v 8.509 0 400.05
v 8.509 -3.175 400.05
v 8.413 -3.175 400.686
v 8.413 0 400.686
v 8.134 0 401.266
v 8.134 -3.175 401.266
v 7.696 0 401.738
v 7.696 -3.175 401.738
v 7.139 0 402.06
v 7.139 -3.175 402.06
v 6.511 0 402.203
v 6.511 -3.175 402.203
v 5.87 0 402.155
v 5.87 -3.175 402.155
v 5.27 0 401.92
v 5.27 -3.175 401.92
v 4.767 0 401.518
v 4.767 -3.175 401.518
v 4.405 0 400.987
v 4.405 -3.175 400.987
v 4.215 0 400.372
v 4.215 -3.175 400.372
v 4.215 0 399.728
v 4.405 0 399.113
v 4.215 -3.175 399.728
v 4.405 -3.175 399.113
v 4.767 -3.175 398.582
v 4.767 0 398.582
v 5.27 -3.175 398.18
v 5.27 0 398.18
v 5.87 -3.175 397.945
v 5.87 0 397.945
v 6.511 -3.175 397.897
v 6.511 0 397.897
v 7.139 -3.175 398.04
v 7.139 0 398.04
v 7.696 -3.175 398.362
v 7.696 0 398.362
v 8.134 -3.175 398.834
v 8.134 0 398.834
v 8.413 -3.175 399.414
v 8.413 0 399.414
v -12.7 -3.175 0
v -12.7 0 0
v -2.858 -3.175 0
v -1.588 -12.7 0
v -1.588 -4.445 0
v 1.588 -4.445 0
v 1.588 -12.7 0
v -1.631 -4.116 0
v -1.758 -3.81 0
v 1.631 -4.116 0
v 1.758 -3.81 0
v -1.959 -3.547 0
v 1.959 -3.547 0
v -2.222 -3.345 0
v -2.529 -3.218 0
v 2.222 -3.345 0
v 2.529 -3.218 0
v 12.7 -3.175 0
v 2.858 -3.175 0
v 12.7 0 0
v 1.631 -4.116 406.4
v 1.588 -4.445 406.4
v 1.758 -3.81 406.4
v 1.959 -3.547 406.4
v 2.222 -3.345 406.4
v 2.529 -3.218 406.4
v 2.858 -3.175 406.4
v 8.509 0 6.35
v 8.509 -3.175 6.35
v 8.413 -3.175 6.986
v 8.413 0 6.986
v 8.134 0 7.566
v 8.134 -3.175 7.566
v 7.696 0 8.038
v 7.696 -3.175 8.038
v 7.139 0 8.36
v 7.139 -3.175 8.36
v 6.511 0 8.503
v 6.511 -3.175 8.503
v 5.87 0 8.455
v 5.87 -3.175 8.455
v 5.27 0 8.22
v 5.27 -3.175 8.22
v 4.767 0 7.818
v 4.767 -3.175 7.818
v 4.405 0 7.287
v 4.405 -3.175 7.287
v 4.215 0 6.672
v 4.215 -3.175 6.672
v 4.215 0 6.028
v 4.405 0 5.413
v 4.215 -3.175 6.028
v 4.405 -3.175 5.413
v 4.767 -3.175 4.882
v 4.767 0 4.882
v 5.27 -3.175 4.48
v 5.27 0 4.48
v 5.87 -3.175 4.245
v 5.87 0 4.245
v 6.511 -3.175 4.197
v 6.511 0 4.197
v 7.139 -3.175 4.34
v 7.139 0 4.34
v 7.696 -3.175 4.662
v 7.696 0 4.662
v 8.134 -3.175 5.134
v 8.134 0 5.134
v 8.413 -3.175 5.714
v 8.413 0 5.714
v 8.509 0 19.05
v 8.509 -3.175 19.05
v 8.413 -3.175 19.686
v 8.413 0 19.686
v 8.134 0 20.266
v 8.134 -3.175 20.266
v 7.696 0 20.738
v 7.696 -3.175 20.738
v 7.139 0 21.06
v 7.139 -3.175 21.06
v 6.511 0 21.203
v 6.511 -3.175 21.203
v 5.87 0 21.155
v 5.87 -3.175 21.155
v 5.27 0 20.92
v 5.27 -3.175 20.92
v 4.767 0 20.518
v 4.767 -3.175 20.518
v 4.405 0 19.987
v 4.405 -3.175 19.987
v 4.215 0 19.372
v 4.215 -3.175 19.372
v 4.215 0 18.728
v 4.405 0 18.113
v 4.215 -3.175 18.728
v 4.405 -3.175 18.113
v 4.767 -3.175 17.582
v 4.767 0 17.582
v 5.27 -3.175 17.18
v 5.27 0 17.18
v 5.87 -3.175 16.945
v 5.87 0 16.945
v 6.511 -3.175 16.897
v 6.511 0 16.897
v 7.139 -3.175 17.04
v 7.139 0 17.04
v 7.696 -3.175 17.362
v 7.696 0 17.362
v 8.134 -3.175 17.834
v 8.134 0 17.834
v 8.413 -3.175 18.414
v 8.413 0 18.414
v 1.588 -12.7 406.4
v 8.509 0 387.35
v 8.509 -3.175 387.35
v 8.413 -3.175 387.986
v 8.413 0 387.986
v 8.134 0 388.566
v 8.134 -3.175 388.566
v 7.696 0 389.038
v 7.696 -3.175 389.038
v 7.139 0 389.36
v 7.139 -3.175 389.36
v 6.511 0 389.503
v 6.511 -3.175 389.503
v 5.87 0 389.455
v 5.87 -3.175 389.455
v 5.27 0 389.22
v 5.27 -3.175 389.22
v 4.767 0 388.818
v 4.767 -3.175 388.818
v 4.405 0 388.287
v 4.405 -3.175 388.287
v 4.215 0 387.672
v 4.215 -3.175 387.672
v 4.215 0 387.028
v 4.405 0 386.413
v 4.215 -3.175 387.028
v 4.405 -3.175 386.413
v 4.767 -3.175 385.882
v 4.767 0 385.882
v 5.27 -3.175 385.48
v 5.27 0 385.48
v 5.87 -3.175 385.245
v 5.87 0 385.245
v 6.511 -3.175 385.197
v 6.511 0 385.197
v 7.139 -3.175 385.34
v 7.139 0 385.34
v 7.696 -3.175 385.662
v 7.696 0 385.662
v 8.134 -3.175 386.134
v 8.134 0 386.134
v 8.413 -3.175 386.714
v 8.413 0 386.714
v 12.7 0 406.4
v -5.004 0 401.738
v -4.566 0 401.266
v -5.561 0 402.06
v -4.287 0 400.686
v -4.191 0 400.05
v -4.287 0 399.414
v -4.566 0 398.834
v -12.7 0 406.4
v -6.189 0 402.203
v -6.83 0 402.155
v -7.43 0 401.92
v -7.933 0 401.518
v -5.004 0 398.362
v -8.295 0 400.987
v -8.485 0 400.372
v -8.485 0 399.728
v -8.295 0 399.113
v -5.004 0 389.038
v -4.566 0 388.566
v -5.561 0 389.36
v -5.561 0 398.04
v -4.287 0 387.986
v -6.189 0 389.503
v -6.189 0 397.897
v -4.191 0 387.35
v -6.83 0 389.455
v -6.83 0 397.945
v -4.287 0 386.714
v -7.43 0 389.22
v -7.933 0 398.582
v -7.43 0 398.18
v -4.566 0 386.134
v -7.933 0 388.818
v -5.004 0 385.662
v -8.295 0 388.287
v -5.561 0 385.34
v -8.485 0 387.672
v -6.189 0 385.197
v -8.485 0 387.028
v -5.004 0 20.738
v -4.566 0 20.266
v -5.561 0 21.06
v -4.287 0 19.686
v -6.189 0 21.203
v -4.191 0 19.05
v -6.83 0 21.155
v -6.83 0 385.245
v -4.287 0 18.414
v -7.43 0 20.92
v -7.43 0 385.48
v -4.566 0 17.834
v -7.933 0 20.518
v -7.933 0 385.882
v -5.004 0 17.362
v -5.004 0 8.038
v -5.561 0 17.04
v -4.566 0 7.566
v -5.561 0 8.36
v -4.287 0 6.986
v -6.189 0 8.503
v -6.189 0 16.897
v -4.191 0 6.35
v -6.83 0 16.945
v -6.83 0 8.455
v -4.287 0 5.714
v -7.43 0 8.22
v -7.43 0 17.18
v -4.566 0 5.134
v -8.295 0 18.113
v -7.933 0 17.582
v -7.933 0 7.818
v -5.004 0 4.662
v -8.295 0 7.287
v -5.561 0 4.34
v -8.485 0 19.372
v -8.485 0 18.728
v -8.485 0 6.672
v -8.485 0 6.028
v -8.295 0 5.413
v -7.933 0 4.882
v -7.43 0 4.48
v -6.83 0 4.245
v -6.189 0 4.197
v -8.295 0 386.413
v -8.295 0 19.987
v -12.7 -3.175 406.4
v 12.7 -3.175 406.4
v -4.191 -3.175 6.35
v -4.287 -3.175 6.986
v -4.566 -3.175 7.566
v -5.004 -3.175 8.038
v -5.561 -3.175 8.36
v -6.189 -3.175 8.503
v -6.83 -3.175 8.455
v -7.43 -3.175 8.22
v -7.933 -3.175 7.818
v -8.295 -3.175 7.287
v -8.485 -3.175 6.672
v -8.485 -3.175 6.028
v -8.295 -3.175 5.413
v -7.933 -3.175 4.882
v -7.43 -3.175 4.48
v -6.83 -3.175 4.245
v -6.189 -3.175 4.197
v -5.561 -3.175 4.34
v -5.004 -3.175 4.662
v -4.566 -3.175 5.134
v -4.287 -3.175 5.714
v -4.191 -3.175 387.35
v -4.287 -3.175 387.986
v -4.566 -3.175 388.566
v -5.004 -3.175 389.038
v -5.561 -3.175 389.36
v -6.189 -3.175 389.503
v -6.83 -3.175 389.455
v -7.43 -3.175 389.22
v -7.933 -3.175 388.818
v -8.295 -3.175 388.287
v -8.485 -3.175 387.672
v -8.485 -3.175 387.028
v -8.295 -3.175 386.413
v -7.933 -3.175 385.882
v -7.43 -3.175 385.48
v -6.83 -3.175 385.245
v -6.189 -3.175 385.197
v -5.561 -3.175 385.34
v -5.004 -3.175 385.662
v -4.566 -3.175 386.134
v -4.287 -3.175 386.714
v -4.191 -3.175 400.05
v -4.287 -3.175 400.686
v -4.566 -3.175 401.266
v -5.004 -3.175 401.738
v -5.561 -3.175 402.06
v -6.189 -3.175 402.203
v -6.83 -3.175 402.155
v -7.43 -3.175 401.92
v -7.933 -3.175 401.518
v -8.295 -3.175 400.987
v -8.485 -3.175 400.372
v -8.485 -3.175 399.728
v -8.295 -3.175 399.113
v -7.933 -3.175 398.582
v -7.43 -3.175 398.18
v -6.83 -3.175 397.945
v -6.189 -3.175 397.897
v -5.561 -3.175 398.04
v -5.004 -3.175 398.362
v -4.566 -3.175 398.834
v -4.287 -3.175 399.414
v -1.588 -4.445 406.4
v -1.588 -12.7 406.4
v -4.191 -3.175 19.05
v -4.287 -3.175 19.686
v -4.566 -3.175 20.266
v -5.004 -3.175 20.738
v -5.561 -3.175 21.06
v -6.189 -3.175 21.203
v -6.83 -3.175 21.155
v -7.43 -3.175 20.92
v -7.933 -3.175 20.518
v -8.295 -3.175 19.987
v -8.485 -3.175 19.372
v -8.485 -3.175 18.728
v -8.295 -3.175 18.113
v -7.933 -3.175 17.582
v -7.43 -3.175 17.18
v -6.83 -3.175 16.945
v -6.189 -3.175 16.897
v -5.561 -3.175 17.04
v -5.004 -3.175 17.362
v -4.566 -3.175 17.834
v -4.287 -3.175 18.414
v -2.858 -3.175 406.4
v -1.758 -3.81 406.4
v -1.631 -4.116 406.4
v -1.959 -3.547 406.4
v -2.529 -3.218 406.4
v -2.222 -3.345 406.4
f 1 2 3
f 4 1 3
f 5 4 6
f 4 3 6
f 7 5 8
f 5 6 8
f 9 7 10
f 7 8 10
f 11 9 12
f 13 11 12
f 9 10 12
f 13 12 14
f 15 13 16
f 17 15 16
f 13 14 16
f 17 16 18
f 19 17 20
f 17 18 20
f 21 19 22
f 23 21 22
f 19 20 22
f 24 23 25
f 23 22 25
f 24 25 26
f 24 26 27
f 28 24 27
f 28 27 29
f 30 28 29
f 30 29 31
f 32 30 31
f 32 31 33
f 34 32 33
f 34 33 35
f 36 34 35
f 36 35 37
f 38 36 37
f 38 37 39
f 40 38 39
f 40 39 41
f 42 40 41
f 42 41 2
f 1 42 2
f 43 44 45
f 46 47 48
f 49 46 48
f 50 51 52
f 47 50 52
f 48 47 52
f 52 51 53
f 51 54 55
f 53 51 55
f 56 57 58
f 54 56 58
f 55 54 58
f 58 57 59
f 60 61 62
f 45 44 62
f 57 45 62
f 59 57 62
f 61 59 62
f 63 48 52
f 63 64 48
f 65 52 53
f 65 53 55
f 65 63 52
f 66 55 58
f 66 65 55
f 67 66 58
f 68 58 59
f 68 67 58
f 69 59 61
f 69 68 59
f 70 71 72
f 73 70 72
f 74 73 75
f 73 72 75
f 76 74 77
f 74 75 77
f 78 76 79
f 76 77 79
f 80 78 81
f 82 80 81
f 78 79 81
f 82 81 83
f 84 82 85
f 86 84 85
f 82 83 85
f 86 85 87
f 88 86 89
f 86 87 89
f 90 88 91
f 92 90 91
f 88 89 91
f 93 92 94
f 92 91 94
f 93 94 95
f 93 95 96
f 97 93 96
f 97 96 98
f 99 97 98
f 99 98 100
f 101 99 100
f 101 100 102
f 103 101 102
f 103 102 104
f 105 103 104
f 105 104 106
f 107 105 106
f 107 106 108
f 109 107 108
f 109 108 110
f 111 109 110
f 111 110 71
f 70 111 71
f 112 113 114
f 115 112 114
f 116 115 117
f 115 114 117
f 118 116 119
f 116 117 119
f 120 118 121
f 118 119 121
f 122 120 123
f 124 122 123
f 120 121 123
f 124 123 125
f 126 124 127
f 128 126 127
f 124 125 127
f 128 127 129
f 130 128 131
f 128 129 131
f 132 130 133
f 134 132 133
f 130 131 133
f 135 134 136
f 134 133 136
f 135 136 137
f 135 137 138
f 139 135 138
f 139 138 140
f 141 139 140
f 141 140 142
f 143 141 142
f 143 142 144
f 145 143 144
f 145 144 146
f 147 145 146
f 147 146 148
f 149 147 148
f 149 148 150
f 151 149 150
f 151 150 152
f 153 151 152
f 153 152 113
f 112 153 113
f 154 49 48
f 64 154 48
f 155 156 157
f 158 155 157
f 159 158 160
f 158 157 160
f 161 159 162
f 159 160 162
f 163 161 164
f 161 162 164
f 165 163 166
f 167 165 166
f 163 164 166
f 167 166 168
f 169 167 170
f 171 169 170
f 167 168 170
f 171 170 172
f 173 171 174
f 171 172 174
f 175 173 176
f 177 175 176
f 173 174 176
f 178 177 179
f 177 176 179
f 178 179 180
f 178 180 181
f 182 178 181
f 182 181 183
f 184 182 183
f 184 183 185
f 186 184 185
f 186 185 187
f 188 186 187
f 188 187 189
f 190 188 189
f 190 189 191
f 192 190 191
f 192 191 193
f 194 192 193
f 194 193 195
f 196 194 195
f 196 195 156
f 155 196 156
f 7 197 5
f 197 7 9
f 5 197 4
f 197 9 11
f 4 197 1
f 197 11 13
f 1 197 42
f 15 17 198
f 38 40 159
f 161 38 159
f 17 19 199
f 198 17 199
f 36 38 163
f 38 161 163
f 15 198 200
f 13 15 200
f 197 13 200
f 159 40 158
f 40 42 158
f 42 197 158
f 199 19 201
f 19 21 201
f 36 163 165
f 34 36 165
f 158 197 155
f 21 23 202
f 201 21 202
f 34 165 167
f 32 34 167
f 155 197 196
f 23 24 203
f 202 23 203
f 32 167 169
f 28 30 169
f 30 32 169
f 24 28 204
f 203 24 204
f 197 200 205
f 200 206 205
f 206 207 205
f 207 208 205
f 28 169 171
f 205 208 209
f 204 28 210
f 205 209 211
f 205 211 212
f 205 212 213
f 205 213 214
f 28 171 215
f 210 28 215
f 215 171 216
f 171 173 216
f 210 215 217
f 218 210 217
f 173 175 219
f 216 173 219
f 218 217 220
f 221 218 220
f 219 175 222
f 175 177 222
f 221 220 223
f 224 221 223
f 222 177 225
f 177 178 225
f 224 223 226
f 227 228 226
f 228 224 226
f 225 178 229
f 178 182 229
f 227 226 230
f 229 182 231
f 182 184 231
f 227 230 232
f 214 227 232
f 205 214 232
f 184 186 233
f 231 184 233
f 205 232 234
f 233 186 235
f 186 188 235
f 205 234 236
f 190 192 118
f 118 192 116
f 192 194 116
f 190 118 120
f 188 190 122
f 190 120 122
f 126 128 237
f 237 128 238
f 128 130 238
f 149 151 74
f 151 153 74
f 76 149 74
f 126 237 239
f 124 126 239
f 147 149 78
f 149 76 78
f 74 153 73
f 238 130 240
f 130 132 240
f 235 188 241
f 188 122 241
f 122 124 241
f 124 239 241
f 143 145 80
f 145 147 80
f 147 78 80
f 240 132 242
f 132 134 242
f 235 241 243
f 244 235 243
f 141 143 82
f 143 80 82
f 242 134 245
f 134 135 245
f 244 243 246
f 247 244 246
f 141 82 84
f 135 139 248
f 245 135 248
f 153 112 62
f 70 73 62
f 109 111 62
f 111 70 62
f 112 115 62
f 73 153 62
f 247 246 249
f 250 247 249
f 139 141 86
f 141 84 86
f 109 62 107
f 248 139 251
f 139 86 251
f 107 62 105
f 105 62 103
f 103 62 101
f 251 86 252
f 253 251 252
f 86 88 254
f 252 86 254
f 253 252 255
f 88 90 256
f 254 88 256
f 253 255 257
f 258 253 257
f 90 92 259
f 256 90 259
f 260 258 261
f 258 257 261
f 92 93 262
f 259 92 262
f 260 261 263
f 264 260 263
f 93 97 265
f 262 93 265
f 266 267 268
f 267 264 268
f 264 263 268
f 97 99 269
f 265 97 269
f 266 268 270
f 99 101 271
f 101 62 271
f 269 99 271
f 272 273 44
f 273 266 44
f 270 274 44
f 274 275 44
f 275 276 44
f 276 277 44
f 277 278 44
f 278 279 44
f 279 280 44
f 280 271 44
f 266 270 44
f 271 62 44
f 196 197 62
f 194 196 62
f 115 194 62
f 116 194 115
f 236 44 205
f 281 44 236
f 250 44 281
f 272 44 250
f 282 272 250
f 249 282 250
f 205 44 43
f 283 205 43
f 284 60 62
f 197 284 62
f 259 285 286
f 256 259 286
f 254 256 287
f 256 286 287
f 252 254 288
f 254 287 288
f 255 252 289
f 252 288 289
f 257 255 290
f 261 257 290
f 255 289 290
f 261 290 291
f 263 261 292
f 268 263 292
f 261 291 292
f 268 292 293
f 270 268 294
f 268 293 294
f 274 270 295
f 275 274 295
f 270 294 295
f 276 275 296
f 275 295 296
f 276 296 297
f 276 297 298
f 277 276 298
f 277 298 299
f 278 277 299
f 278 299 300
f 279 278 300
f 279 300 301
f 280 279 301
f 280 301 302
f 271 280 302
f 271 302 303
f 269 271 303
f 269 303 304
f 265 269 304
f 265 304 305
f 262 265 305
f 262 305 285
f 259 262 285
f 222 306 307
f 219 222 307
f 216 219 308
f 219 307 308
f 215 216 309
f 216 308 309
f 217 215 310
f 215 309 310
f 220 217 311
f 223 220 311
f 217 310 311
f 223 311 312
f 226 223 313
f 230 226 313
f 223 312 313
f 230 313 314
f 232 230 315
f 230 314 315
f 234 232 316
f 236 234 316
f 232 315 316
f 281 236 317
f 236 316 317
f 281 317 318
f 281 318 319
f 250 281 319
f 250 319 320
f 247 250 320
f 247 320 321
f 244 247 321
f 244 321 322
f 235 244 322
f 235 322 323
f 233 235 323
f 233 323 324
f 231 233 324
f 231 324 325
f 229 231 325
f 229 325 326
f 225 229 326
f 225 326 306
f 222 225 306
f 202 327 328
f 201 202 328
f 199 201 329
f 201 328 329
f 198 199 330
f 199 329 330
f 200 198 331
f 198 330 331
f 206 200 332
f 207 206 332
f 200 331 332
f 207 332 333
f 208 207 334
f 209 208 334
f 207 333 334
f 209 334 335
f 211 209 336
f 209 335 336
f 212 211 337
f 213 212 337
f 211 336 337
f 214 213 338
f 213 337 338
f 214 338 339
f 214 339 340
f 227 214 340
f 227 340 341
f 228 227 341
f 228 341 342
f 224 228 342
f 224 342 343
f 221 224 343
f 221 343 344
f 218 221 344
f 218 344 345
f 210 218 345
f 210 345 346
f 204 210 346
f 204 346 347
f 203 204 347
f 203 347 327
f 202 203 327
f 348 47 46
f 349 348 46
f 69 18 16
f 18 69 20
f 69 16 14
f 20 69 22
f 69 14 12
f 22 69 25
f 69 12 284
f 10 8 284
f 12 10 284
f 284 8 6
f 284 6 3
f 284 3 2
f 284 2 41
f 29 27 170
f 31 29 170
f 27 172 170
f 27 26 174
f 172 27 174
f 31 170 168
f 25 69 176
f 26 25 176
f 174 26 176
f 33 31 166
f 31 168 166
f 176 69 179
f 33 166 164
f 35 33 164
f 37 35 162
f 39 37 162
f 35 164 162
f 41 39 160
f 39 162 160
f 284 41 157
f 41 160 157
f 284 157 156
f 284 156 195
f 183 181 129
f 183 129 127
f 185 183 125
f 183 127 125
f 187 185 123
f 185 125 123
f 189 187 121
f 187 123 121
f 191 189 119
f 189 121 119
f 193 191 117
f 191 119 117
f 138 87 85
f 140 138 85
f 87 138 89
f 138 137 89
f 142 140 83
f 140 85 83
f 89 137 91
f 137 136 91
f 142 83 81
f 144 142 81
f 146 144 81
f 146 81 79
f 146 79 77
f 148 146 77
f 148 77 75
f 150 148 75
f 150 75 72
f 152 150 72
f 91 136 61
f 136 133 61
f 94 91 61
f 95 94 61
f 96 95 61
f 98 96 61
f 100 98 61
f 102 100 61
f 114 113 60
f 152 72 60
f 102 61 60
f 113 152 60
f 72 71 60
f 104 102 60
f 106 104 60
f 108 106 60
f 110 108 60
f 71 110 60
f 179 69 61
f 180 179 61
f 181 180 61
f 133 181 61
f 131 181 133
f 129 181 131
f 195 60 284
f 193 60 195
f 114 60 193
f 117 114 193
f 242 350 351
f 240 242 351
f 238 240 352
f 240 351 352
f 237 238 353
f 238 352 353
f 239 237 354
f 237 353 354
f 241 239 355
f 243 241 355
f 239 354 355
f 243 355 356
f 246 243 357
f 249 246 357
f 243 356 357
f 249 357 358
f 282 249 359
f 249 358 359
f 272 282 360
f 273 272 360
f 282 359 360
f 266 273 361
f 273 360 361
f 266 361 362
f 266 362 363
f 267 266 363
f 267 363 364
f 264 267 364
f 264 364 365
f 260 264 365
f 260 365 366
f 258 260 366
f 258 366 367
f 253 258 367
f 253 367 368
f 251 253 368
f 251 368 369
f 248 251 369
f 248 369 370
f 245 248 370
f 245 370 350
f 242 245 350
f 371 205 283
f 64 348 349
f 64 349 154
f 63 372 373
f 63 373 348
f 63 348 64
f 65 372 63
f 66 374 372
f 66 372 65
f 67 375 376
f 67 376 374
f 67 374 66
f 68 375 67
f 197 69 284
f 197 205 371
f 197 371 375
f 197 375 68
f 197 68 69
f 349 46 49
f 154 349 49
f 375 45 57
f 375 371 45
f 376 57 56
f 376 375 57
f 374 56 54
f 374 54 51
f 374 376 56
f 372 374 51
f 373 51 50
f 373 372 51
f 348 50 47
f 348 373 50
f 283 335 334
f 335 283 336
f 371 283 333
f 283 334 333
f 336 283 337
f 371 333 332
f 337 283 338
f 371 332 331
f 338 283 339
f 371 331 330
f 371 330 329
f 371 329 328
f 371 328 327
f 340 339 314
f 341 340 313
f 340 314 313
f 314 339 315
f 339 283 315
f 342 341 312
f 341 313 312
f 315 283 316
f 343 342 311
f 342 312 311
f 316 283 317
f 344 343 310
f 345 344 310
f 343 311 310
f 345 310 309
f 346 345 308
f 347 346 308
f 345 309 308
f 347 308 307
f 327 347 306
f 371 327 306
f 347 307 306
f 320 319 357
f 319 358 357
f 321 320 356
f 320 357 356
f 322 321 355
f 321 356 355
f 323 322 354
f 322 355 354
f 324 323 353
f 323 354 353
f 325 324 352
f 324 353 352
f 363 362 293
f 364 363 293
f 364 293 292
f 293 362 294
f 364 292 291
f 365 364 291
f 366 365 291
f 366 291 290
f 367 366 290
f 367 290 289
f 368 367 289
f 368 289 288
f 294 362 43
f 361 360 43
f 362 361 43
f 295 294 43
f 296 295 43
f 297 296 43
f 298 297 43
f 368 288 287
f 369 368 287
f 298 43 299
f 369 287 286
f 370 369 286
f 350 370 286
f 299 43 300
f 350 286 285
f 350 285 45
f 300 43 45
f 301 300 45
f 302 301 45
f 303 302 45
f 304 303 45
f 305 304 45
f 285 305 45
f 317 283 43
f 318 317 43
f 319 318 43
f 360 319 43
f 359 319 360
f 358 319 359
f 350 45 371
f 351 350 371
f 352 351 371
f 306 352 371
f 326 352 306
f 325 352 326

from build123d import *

# Parameters (mm, degrees)
F1_DEPTH = 406.4
F2_R     = 1.27
F4_D     = 4.318
F4_DEPTH = 25.4
F4_TIP   = 1.2972580765


with BuildPart() as f1:
    # F0 (on Top) → F1 (new body)
    with BuildSketch(Plane.XY):
        Polygon((12.7, 0), (0, 0), (-12.7, 0), (-12.7, -3.175), (-1.5875, -3.175), (-1.5875, -12.7), (0, -12.7), (1.5875, -12.7), (1.5875, -3.175), (12.7, -3.175), align=None)
    extrude(amount=F1_DEPTH)

    # F2
    f2_edges = [f1.edges().sort_by_distance(p)[0] for p in [
        (-1.5875, -3.175, 203.2),
        (1.5875, -3.175, 203.2),
    ]]
    fillet(f2_edges, radius=F2_R)

    # F4
    with Locations(Plane(origin=(0, 0, 0), x_dir=(-1, 0, 0), z_dir=(0, 1, 0))):
        with Locations((-6.35, 400.05), (-6.35, 387.35), (6.35, 387.35), (6.35, 400.05), (-6.35, 6.35), (-6.35, 19.05), (6.35, 19.05), (6.35, 6.35)):
            Hole(F4_D / 2, depth=F4_DEPTH)
            with Locations((0, 0, -(F4_DEPTH + F4_TIP / 2))):  # 118° drill point
                Cone(0, F4_D / 2, F4_TIP, mode=Mode.SUBTRACT)


solid = f1.part
